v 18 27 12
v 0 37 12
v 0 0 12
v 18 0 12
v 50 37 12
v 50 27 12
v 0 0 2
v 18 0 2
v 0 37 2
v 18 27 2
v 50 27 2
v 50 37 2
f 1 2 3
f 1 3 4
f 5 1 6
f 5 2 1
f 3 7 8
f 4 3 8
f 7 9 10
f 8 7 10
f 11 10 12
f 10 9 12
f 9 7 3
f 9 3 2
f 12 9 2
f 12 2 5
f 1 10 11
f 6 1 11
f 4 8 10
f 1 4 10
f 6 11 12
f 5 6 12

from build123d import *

# Parameters (mm, degrees)
BOX001_W     = 32
BOX001_H     = 10
BOX001_DEPTH = 10
BOX_W        = 18
BOX_H        = 37
BOX_DEPTH    = 10


with BuildPart() as cubo001:
    # Box001 → Box001 (new body)
    with BuildSketch(Plane(origin=(18, 27, 0), x_dir=(1, 0, 0), z_dir=(0, 0, 1))):
        with Locations((16, 5)):
            Rectangle(BOX001_W, BOX001_H)
    extrude(amount=BOX001_DEPTH)


with BuildPart() as base:
    # Box → Box (new body)
    with BuildSketch(Plane.XY):
        with Locations((9, 18.5)):
            Rectangle(BOX_W, BOX_H)
    extrude(amount=BOX_DEPTH)

    # Fusion: union Cubo001
    add(cubo001.part)


with BuildPart() as base_1:
    # Fusion placement: moved
    add(base.part.moved(Location((0, 0, 2))))


solid = base_1.part
